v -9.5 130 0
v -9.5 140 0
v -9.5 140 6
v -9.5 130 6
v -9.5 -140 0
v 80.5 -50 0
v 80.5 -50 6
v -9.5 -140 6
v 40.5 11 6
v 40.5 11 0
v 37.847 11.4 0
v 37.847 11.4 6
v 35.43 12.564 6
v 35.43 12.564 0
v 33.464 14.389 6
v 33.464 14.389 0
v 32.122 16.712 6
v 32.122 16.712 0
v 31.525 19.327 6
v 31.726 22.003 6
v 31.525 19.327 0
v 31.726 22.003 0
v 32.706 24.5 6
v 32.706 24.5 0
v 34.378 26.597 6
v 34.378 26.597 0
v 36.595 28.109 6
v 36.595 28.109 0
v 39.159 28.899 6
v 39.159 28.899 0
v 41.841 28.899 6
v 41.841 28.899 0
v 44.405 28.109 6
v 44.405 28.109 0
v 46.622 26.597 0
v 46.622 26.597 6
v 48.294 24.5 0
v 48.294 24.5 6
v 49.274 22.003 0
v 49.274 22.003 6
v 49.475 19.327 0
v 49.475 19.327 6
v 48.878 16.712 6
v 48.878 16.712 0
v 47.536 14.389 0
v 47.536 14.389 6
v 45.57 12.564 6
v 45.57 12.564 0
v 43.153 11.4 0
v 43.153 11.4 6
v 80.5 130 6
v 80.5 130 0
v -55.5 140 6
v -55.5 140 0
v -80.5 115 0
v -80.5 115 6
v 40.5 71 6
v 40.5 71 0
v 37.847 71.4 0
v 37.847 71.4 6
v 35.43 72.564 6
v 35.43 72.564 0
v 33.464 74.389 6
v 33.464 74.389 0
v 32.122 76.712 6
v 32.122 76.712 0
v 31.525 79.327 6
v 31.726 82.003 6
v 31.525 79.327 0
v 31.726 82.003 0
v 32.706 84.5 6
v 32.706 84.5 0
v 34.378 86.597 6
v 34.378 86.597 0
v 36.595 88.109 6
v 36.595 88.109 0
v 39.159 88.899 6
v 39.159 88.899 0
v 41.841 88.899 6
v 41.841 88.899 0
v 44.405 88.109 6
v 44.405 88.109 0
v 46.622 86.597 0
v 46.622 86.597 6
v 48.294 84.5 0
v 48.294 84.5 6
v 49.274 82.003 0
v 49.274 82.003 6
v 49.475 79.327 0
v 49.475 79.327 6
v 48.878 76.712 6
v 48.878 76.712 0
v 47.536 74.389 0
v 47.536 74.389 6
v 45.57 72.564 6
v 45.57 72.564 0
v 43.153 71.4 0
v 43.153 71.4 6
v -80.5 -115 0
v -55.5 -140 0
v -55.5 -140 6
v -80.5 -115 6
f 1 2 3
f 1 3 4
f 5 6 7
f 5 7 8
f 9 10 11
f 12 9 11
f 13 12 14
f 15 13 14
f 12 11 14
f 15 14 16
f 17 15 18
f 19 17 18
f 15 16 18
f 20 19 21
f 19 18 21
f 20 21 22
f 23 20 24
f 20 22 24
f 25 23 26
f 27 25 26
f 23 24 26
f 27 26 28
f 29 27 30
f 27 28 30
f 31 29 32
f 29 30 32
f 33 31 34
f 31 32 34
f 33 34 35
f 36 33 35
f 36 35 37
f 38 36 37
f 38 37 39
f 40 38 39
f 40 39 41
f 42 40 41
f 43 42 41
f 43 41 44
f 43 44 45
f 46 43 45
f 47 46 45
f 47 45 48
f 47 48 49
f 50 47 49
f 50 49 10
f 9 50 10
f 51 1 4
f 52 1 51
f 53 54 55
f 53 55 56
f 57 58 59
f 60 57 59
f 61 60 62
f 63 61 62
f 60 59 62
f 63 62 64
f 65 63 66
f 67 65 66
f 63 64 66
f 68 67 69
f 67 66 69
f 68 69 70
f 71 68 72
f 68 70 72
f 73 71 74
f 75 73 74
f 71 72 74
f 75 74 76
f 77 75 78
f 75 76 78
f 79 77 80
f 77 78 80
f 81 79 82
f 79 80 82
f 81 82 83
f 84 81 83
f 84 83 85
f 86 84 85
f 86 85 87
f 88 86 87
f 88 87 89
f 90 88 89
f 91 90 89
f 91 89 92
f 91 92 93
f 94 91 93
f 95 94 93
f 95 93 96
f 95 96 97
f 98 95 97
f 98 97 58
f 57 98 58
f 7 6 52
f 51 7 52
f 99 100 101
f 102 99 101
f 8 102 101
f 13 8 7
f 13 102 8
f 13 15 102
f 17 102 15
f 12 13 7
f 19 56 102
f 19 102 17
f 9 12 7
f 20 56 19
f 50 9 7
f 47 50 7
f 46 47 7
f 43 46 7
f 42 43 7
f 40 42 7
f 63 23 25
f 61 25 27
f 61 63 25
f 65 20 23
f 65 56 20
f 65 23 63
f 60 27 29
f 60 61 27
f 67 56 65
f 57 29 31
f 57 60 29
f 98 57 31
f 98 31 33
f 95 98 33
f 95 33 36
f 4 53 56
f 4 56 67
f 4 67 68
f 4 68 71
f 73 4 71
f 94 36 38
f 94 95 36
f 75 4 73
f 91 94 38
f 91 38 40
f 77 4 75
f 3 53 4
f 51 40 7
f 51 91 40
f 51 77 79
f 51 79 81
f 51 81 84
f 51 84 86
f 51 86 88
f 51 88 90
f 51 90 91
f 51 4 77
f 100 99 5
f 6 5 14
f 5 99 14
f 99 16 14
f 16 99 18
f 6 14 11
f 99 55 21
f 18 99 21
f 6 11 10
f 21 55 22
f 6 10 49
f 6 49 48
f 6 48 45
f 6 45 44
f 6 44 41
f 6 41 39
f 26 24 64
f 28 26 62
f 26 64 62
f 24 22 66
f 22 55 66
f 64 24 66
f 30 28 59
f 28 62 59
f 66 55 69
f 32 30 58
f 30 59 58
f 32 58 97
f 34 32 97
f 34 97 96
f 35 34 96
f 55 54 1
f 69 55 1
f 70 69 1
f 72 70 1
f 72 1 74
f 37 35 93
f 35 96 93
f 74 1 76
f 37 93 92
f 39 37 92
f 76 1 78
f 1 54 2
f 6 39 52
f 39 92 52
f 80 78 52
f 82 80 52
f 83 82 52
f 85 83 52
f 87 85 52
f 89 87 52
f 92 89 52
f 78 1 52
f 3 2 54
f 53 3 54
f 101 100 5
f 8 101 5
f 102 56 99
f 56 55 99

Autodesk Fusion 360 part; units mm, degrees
sketch "スケッチ1" plane through (0, 0, 0) normal (0, 0, 1) x (1, 0, 0)
  line L0 (-9.5, 140) -> (-80.5, 140)
  line L1 (-80.5, 140) -> (-80.5, -140)
  line L2 (-80.5, -140) -> (-9.5, -140)
  line L3 (80.5, -50) -> (80.5, 130)
  line L4 (74.75, 130) -> (-80.5, -140) construction
  line L5 (-80.5, 140) -> (47.6429, -82.8571) construction
  line L6 (-9.5, 140) -> (-9.5, 130)
  line L7 (-9.5, 130) -> (80.5, 130)
  line L8 (-80.5, -140) -> (-9.5, -140) construction
  line L9 (80.5, -50) -> (-9.5, -140)
  dimension "d2" = 280
  dimension "d5" = 71
extrude "押し出し1" add sketch "スケッチ1" along normal blind 6
chamfer "面取り1" distance 25 angle 45 2 edges at (-80.5, -140, 3) (-80.5, 140, 3)
sketch "スケッチ2" plane through (0, 0, 6) normal (0, 0, 1) x (-1, 0, 0)
  line L0 (55.5, -140) -> (80.5, -115)
  line L1 (80.5, -115) -> (80.5, 115)
  line L2 (80.5, 115) -> (55.5, 140)
  line L3 (55.5, 140) -> (9.5, 140)
  line L4 (9.5, 140) -> (-80.5, 50)
  line L5 (-80.5, 50) -> (-80.5, -130)
  line L6 (-80.5, -130) -> (9.5, -130)
  line L7 (9.5, -130) -> (9.5, -140)
  line L8 (9.5, -140) -> (55.5, -140)
  line L9 (-80.5, -130) -> (-40.5, -130) construction
  line L10 (-40.5, -130) -> (-40.5, -80) construction
  line L11 (-40.5, -80) -> (-80.5, -80) construction
  line L12 (-80.5, -80) -> (-80.5, -130) construction
  line L13 (-40.5, -80) -> (-40.5, -20) construction
  point P0 (-40.5, -80)
  point P1 (-40.5, -20)
  dimension "d10" = 40
  dimension "d11" = 50
  dimension "d12" = 60
hole "穴1" at (40.5, 80, 6) at (40.5, 20, 6) direction (0, 0, -1) diameter 18 end through all
equation "d5 = 25 mm + 46 mm"
